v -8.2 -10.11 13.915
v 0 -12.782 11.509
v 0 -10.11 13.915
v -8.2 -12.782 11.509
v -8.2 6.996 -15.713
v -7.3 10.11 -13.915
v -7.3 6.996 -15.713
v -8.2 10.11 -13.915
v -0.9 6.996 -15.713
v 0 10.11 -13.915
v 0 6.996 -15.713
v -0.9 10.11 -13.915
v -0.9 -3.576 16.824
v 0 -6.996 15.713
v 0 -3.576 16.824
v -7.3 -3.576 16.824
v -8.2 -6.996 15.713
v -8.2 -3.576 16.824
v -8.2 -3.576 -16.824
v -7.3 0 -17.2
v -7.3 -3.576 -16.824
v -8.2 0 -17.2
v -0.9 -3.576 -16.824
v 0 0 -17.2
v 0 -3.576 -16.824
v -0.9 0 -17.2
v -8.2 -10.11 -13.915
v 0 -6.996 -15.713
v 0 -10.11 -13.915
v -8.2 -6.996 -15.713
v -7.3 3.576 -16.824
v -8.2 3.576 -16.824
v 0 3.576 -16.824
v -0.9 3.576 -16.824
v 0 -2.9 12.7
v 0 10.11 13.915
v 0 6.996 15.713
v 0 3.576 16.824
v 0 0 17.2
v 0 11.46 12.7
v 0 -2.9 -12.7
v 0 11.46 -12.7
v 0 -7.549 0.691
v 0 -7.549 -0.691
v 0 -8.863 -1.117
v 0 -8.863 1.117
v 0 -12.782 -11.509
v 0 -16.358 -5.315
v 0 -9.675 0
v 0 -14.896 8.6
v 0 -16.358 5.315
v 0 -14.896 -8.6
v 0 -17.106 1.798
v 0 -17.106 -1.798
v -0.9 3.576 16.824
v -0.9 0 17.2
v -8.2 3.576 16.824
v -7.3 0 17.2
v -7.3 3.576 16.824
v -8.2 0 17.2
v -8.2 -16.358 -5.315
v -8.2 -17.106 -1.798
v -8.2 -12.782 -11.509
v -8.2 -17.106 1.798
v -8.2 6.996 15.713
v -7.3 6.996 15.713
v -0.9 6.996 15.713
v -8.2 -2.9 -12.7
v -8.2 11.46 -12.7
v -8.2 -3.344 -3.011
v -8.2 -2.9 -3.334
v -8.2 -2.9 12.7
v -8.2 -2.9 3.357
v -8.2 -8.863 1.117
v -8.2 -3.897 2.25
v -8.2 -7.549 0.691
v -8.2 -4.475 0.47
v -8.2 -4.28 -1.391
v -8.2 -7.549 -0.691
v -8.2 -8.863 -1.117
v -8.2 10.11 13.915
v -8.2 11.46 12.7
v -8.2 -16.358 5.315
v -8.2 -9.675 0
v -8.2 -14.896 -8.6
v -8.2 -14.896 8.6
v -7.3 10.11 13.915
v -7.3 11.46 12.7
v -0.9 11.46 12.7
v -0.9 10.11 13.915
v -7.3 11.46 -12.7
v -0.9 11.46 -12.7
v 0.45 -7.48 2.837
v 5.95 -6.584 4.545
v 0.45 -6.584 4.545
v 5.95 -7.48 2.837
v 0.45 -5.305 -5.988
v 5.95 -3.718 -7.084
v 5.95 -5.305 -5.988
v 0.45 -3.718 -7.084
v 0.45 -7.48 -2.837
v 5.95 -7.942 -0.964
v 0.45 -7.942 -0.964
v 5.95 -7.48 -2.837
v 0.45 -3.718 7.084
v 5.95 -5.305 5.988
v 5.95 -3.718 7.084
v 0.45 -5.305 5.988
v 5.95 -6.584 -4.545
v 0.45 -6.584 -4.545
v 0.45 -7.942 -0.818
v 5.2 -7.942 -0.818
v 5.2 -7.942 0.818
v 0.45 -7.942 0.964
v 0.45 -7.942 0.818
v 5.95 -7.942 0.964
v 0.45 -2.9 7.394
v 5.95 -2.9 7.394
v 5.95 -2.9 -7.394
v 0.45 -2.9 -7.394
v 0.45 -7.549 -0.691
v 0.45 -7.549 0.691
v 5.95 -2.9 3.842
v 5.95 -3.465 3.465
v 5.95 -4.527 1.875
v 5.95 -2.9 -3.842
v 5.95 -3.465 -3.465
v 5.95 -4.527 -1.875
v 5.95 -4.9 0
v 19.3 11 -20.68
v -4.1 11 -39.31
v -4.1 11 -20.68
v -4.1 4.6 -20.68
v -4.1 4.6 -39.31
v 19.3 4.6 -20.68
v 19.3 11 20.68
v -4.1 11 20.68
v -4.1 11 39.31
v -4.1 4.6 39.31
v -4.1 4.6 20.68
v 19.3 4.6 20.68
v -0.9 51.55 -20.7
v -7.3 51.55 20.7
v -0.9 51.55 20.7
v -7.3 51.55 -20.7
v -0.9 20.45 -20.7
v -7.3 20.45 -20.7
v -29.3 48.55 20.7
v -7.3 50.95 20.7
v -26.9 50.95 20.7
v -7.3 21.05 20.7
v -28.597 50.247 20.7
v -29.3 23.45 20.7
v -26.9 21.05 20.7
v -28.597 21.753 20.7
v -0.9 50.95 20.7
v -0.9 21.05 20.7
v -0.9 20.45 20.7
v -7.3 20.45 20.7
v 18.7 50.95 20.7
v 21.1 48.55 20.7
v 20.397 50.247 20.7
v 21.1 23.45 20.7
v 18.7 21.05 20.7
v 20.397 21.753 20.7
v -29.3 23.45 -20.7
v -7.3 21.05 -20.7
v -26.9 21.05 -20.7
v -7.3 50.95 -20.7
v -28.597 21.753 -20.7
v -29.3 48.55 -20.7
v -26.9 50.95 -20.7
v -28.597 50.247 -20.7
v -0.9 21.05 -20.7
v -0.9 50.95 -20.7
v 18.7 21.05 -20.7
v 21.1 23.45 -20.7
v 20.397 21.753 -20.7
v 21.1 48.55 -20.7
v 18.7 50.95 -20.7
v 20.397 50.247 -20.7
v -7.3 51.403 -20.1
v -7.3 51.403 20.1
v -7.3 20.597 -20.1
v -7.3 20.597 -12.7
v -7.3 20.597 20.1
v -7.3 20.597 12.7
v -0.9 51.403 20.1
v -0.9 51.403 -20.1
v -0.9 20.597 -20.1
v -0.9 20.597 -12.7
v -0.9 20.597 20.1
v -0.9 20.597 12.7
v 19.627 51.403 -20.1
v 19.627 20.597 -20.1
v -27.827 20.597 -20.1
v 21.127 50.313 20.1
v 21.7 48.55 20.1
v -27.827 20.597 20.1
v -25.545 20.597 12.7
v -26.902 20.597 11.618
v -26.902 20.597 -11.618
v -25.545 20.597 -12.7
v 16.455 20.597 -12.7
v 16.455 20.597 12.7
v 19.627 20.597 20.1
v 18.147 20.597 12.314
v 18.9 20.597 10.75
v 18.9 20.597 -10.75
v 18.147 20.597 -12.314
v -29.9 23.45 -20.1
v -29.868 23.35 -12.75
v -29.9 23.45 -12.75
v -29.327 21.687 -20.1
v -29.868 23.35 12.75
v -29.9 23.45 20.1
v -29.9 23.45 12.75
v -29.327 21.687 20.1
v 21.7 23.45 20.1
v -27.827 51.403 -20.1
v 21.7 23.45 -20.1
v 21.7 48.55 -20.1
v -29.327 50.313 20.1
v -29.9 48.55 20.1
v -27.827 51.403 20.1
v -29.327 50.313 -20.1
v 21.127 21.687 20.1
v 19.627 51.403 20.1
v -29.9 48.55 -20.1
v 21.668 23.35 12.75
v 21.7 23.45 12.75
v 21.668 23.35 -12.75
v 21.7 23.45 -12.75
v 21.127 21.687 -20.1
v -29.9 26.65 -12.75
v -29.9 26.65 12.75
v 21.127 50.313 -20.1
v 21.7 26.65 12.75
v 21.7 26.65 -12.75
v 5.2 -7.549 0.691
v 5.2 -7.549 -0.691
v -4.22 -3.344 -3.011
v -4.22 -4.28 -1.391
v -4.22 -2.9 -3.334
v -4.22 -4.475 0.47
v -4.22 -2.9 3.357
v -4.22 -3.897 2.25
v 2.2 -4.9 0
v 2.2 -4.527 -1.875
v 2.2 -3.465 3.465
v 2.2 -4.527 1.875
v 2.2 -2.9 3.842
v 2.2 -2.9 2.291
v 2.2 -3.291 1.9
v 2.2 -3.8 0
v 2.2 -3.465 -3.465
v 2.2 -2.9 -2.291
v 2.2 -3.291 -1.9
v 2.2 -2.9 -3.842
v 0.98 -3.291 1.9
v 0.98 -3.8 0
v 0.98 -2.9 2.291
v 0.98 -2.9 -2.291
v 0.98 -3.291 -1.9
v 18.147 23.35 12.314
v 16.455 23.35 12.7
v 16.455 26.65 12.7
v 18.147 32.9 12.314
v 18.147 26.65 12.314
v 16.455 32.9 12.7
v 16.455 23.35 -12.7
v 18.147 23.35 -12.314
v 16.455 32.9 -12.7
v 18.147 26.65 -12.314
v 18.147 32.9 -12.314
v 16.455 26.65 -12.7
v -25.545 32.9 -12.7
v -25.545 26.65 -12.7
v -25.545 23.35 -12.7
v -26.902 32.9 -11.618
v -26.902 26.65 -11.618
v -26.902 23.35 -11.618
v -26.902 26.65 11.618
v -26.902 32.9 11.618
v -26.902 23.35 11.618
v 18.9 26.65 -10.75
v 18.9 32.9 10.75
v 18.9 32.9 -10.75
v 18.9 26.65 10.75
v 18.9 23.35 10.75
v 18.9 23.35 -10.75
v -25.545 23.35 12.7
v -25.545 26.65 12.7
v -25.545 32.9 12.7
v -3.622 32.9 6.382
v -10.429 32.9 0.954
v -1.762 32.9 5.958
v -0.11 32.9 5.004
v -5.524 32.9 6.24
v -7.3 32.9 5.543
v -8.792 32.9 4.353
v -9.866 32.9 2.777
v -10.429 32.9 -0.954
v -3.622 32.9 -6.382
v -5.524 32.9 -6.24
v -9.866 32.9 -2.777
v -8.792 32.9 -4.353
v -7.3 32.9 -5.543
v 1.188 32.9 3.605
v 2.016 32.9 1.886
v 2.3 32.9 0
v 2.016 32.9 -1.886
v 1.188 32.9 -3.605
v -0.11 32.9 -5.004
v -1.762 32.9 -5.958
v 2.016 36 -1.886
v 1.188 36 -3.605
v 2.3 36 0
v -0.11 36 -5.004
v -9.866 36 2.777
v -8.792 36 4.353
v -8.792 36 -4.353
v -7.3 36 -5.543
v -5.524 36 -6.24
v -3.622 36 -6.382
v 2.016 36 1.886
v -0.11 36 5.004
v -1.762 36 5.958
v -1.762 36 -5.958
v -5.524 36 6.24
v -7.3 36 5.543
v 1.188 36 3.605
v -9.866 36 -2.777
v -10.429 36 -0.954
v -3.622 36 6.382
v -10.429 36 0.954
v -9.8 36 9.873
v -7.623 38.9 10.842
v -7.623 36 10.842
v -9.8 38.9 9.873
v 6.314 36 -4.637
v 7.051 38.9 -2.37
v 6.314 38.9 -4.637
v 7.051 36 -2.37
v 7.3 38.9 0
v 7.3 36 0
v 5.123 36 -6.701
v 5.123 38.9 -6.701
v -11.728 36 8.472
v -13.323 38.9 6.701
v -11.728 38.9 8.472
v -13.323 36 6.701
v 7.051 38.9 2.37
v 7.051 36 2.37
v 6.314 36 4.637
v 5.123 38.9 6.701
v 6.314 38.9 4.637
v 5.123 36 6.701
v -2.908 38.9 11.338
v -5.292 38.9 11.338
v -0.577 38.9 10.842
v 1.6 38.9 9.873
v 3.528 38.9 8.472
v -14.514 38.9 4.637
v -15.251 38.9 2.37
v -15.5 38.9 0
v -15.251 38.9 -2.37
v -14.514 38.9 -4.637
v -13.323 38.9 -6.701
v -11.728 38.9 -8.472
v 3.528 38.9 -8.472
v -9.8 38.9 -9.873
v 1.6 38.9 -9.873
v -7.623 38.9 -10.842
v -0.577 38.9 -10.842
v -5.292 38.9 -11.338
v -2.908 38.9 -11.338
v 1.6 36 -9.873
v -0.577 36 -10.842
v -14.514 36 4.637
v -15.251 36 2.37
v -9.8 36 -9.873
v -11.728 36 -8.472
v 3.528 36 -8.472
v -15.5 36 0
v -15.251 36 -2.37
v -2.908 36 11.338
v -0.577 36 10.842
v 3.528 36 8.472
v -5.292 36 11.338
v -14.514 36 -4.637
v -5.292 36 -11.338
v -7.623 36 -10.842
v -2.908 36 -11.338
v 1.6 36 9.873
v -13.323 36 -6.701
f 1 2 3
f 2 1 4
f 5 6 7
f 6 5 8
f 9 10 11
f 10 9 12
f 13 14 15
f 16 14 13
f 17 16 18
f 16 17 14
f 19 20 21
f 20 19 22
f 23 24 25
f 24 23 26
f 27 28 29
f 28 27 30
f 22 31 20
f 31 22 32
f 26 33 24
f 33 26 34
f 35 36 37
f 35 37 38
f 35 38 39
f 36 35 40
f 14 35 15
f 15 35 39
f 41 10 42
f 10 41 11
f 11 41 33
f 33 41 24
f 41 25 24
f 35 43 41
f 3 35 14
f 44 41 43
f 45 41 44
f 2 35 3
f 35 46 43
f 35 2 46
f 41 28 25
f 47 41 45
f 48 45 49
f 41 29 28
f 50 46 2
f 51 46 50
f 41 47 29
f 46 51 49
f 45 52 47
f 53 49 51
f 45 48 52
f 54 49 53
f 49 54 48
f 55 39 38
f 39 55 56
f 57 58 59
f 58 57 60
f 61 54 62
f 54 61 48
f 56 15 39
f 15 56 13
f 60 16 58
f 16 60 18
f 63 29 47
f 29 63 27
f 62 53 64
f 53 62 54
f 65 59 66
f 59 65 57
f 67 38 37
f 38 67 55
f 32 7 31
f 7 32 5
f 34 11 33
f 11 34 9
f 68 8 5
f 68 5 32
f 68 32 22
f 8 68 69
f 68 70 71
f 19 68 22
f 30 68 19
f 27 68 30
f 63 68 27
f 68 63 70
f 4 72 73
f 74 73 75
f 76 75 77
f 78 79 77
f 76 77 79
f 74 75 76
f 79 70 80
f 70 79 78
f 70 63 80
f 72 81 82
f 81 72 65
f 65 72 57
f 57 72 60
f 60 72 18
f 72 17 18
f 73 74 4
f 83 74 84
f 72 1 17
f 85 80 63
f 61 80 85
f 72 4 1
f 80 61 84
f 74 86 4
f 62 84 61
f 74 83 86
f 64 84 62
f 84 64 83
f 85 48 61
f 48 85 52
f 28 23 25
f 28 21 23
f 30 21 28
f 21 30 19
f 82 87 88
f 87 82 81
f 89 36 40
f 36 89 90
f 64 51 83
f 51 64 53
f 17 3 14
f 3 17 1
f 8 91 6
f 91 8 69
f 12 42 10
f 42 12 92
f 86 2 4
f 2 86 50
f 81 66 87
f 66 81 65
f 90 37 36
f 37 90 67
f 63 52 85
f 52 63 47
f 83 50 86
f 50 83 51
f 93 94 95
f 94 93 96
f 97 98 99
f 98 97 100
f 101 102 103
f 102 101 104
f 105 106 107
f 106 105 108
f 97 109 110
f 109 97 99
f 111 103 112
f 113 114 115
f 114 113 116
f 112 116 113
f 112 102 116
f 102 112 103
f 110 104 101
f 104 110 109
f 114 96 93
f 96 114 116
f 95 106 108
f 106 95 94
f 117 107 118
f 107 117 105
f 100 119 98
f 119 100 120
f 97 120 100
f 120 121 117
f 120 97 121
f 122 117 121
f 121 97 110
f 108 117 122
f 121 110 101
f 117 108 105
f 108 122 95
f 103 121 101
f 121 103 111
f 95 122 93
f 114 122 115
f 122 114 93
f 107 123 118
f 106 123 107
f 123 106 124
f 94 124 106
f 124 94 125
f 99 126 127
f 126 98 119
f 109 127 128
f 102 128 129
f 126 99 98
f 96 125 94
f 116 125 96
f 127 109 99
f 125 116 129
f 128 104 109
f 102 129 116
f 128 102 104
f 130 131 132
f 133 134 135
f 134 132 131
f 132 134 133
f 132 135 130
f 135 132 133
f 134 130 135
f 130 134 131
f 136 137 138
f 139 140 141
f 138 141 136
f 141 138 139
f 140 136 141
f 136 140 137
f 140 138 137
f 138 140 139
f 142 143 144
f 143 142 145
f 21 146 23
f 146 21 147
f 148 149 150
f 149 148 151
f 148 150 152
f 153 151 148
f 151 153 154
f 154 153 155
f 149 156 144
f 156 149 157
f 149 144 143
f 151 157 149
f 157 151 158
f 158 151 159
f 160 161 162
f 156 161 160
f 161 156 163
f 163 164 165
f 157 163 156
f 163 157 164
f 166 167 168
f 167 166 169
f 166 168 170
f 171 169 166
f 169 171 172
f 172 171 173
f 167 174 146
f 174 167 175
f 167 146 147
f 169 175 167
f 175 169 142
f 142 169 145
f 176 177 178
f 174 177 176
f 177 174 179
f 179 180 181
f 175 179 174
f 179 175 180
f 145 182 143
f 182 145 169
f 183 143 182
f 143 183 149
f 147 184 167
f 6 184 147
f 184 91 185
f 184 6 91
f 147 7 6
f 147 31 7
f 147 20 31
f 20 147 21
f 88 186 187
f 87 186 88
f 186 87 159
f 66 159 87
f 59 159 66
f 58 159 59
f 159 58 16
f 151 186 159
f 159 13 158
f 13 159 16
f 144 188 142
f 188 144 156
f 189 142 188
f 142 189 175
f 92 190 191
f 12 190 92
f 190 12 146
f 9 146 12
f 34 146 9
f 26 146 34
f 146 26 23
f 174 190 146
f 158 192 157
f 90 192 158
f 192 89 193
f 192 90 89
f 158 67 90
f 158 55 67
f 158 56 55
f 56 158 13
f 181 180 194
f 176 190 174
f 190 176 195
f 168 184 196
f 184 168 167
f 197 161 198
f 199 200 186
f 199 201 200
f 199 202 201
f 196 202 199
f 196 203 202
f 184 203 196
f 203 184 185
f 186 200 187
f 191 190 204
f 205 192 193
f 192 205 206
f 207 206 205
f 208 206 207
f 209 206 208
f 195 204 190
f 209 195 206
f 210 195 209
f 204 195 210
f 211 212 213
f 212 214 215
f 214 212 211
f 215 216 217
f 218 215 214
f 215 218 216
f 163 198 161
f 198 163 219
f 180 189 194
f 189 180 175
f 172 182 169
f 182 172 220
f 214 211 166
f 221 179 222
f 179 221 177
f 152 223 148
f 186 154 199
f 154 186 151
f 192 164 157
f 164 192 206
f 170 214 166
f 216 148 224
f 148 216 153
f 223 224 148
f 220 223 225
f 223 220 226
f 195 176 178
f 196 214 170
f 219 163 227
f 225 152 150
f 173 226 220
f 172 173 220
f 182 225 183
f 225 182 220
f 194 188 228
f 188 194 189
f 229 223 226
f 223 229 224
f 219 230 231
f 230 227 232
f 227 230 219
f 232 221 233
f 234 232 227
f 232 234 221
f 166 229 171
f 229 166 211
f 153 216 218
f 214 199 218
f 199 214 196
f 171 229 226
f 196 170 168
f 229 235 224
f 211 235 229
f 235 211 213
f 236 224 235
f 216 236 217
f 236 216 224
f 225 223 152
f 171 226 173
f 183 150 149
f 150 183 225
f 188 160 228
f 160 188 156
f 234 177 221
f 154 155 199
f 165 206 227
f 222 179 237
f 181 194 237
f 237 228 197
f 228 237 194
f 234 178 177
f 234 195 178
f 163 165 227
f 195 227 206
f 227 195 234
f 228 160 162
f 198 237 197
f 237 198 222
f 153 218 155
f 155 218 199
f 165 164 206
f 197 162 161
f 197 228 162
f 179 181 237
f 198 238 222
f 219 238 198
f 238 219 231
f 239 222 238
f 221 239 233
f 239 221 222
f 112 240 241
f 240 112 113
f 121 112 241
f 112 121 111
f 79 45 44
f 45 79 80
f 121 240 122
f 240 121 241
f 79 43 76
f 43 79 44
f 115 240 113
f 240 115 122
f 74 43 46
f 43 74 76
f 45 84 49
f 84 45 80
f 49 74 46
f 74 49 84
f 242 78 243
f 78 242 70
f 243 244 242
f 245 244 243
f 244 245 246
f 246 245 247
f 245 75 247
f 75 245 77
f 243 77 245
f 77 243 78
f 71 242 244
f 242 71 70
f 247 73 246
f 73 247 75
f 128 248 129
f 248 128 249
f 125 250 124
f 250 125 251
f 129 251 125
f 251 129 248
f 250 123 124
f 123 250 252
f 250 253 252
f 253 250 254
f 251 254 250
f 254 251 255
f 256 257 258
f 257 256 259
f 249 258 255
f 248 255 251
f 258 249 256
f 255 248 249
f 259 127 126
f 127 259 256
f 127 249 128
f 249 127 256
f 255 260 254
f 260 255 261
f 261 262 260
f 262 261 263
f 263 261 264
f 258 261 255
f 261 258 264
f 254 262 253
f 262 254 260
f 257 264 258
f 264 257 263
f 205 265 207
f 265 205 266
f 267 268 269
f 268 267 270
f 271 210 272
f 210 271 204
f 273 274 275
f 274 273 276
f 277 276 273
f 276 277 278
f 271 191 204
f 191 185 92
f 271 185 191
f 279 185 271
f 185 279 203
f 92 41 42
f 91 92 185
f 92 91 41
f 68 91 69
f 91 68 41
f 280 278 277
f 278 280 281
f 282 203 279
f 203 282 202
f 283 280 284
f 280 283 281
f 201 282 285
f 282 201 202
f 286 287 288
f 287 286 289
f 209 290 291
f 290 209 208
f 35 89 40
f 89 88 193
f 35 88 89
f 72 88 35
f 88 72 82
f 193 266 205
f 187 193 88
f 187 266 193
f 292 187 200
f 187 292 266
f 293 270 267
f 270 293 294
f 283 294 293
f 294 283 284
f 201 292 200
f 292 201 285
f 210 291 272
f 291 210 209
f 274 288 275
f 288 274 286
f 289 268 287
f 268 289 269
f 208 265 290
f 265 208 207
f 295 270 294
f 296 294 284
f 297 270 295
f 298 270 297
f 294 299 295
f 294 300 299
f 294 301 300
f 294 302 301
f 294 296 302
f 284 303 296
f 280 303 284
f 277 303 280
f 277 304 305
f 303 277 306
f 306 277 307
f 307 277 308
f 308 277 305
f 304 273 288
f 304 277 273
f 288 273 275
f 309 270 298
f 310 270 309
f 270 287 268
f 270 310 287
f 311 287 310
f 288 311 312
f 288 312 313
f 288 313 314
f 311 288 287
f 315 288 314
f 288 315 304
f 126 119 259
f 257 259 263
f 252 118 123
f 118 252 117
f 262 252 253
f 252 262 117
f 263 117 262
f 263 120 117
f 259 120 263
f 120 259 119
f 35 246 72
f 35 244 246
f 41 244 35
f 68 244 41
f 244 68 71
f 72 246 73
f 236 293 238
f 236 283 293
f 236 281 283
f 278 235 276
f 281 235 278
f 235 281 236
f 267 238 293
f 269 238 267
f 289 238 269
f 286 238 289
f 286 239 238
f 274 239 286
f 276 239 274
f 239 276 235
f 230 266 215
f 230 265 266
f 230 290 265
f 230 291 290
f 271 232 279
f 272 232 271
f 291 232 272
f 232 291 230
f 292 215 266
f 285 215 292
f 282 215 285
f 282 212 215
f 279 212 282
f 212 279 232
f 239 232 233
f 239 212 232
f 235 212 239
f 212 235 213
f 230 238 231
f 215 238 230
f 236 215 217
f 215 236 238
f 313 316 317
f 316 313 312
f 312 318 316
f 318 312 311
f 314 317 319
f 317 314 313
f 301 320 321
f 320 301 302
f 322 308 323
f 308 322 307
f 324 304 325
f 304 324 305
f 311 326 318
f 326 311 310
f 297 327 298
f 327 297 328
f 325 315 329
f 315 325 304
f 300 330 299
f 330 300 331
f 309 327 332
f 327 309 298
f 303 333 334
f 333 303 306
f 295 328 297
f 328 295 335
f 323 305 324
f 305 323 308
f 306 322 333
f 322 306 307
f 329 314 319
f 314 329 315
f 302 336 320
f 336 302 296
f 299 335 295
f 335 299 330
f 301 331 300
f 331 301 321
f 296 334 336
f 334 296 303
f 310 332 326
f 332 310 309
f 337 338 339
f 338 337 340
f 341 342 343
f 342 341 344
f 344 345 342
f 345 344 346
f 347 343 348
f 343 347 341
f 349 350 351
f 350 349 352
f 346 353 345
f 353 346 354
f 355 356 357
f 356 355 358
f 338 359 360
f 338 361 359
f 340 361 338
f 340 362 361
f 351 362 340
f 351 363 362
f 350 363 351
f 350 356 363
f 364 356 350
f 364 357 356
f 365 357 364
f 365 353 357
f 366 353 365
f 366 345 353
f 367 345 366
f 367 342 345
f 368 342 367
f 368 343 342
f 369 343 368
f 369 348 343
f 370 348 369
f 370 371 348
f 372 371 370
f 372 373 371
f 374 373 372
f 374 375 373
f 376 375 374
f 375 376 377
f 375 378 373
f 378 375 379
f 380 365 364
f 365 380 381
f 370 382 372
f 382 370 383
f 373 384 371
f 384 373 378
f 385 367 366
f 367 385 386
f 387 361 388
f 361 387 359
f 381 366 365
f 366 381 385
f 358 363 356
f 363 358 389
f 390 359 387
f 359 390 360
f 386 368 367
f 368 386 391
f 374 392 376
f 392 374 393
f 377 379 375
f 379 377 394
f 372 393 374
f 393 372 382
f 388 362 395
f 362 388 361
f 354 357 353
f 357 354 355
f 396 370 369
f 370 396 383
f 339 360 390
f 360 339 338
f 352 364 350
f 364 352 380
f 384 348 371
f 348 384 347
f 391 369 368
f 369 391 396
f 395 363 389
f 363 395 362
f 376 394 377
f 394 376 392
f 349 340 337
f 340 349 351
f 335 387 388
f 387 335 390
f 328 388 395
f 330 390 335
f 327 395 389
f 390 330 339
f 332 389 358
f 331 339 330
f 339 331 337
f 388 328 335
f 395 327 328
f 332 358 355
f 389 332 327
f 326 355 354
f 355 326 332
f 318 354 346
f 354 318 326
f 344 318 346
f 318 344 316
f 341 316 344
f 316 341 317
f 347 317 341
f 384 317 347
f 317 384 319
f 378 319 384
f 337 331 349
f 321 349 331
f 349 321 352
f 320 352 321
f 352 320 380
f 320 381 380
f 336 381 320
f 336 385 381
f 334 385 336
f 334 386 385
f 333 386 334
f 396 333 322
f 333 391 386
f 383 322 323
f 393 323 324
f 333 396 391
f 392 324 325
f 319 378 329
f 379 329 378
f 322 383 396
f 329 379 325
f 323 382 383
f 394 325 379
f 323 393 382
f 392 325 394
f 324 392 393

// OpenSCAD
// file: ../lib/derived_gen.scad
// GENERATED by `python -m bestiary.robots.whelp.export`. DO NOT EDIT.
//
// Every number here comes from spec.py, which carries its provenance, or from
// geometry.py, which derives it. check.py fails if regenerating this file changes
// it, so a hand edit here is not merely discouraged -- it is caught.
//
// To change a dimension: edit spec.py, re-run export, commit both.


// The SOLVED standing stance. Not typed -- geometry.solve_stance_knee()
// puts the wheel axle directly under the hip pivot, which makes the hip's
// static holding torque exactly zero. The URDF is generated from this same
// call, so the assembly preview and the simulation cannot drift apart.

STANCE_ABDUCT = 0;   // rad
STANCE_HIP    = 0.46;
STANCE_KNEE   = -0.97019;
STANCE_ABDUCT_DEG = 0;
STANCE_HIP_DEG    = 26.356059;
STANCE_KNEE_DEG   = -55.587783;

AXLE_DROP     = 185.830956;   // hip pivot -> axle, mm
KNEE_LEVER    = 48.834292;
STAND_HEIGHT  = 229.430956;
WHEEL_CENTRE_Y = 89;
LOADED_WHEEL_R = 43.6;

// Leg placement: [x sign, y sign] per leg, in FL FR RL RR order.
LEG_SIGNS = [[1, 1], [1, -1], [-1, 1], [-1, -1]];
LEG_NAMES = ["FL", "FR", "RL", "RR"];
// file: ../lib/params_gen.scad
// GENERATED by `python -m bestiary.robots.whelp.export`. DO NOT EDIT.
//
// Every number here comes from spec.py, which carries its provenance, or from
// geometry.py, which derives it. check.py fails if regenerating this file changes
// it, so a hand edit here is not merely discouraged -- it is caught.
//
// To change a dimension: edit spec.py, re-run export, commit both.


// 73 constants,
// spec = whelp16, servo = STS3215-C018, material = PETG

TRUNK_L = 250;
TRUNK_W = 104;
TRUNK_H = 58;
TRUNK_WALL = 2.4;
TRUNK_LAP = 26;
ABDUCT_X = 92;
ABDUCT_Y = 36;
ABDUCT_TO_HIP = 36;
ABDUCT_TO_HIP_DROP = 0;
THIGH_L = 110;
CALF_L = 100;
WHEEL_R = 45;
WHEEL_W = 24;
CALF_TO_WHEEL_PLANE = 17;
THIGH_D = 30;
THIGH_WID = 32;
THIGH_WALL = 3.2;
CALF_D = 26;
CALF_WID = 24;
CALF_WALL = 3.2;
FILLET_R = 3;
SERVO_BODY_L = 45.2;
SERVO_BODY_W = 24.7;
SERVO_BODY_H = 35;
SERVO_HORN_BOLT_CIRCLE_D = 17;
SERVO_HORN_BOLT_COUNT = 4;
SERVO_HORN_BOLT_D = 2;
SERVO_HORN_D = 22;
SERVO_HORN_THICK = 2.5;
HORN_BOSS_THICK = 5;
SERVO_HORN_FACE_TO_BODY = 3.5;
SERVO_HORN_HUB_CLEAR_D = 9;
SERVO_HORN_HUB_CLEAR_H = 4;
SERVO_MOUNT_HOLE_DX = 38;
SERVO_MOUNT_HOLE_DY = 18;
SERVO_EAR_SPAN_L = 54;
SERVO_EAR_THICK = 2.5;
SERVO_EAR_Z_FROM_BODY_MID = 10;
SERVO_HAS_REAR_BOSS = true;
SERVO_REAR_BOSS_D = 6;
SERVO_REAR_BOSS_H = 2;
SERVO_OUTPUT_BOSS_D = 12;
SERVO_CABLE_D = 5;
SERVO_CABLE_INSET = 6;
SERVO_CABLE_STUB = 18;
INSERT_BORE = 4.2;
INSERT_OD = 4.6;
INSERT_L = 5.7;
INSERT_WALL = 1.8;
M3_CLEAR = 3.4;
M3_HEAD_D = 5.5;
M3_HEAD_H = 3;
M3_NUT_AF = 5.5;
M3_NUT_T = 2.4;
IDLER_BEARING_ID = 3;
IDLER_BEARING_OD = 10;
IDLER_BEARING_W = 4;
IDLER_BEARING_SHELF = 1.2;
BEARING_PRESS_FIT = -0.2;
TIRE_T = 12;
FUSE_T = 2;
FUSE_SHEAR_AREA = 10;
FUSE_ENABLE = true;
BED_X = 220;
BED_Y = 220;
BED_Z = 240;
NOZZLE = 0.4;
LAYER = 0.2;
FN = 64;

// Derived clearances (nominal thread + printing allowance).
SERVO_MOUNT_SCREW_CLEAR_D = 2.9;
SERVO_MOUNT_SCREW_HEAD_D = 5;
SERVO_MOUNT_SCREW_HEAD_H = 2.5;
SERVO_HORN_BOLT_CLEAR_D = 2.35;
// main file
// abduct_bracket.scad — the hip carrier. One module: abduct_bracket().
//
// FRAME. Origin AT THE ABDUCTION AXIS, which runs along X (fore-aft). This part
// rotates about X and carries the HIP servo, whose output axis is along Y at
// (0, ABDUCT_TO_HIP, -ABDUCT_TO_HIP_DROP). Authored LEFT; mirrored for the right.
//
// This is the most three-dimensional part on the robot: it takes drive about X
// and delivers a mount for a servo whose axis is Y, so it turns a corner. It is
// also the part that carries the entire leg -- about 830 g at up to 190 mm of
// reach -- so it is where a missing fillet costs the most.
//
// ─────────────────────────────────────────────────────────────────────────────
// AN UNRESOLVED INTERFACE, STATED RATHER THAN PAPERED OVER
// ─────────────────────────────────────────────────────────────────────────────
// This file and parts/trunk.scad do not yet agree on how the bracket leaves the
// trunk, and neither has been rendered, so the disagreement is documented here
// instead of being hidden behind a guess.
//
// The kinematics is unambiguous. geometry.build_chain() puts the abduction pivot
// at (+/-ABDUCT_X, +/-ABDUCT_Y, 0) and the hip pivot one step outboard of it at
// (0, +/-ABDUCT_TO_HIP, 0) in the bracket's own frame -- i.e. SAME X, 36 mm
// further out in Y. So the hip axis lands at |y| = 72 mm, which is 20 mm OUTBOARD
// of the trunk's 52 mm half-width. The bracket must therefore cross the trunk's
// SIDE boundary, and it must do so at x = +/-ABDUCT_X.
//
// trunk.scad instead puts a JOURNAL_D plain journal through the trunk's END wall
// at |x| = 125, coaxial with the abduction axis, and has the bracket reach out
// through it. That is a good bearing arrangement and it is a different topology:
// it would place the hip pivot outboard in X, not in Y, which the URDF does not
// describe.
//
// This file is authored to the KINEMATICS, because the URDF is what a policy is
// trained against and the plastic is what has to match it -- not the other way
// round. It exits over the trunk's top rim and down its outside face, which is
// possible precisely because the shell is open-topped for printing. The cost is
// that the second support is a boss on the shell's outer face rather than a
// journal in the end wall, and that boss is NOT modelled here because it belongs
// to the trunk.
//
// WHAT TO DO ABOUT IT, in order of preference:
//   1. Install OpenSCAD, render trunk_front() and abduct_bracket() together, and
//      look. Neither has ever been executed; that is the only honest next step
//      and it is one apt-get away.
//   2. If the over-rim route fouls the lid, move the abduction pivot outboard
//      (raise abduct_y_mm toward the side wall) and shorten abduct_to_hip_mm to
//      keep the track and the abduction moment arm where torque.py wants them.
//      Both are single numbers in spec.py with provenance entries.
//   3. Only then consider changing the URDF, and if so, change spec.py so the
//      kinematics and the CAD are generated from one description again.
//
// Do NOT resolve it by editing params_gen.scad. It is generated, and check.py
// fails if regenerating it changes a byte.
// ─────────────────────────────────────────────────────────────────────────────
//
// PRINT ORIENTATION: the X-axis hub laid on the bed, so the horn pad's face is a
// vertical wall and the leg's bending moment about the abduction axis runs
// in-plane with the extrusions. The cradle for the hip servo then grows upward
// off the hub as a wall rather than hanging off it as an overhang. Footprint
// about 60 x 74 mm.

include <../lib/params_gen.scad>
include <../lib/derived_gen.scad>
use <../lib/util.scad>
use <../lib/sts3215.scad>

EPS = 0.02;

// ── Local numbers ────────────────────────────────────────────────────────────
WALL       = THIGH_WALL;                       // one wall standard across the leg
HUB_D      = SERVO_HORN_D + 2 * WALL + 6;      // the X-axis hub
HUB_L      = HORN_BOSS_THICK + WALL;           // its length along X
ARM_Y      = ABDUCT_TO_HIP;                    // hub centre -> hip axis, laterally
ARM_T      = WALL * 2;                         // the reach's web thickness
ARM_H      = SERVO_BODY_H + 2 * WALL;          // its depth in Z
CRADLE_L   = SERVO_BODY_L + 2 * WALL;
CRADLE_W   = SERVO_BODY_W + 2 * WALL;
GUSSET_L   = ARM_Y * 0.65;
CABLE_R    = SERVO_CABLE_D * 1.6;              // service-loop radius, see below

module abduct_checks() {
    assert(HUB_D / 2 >= SERVO_HORN_BOLT_CIRCLE_D / 2 + SERVO_HORN_BOLT_D + WALL,
           str("hub ", HUB_D, " mm is too small for a ", SERVO_HORN_BOLT_CIRCLE_D,
               " mm bolt circle plus ", WALL, " mm of wall"));
    assert(ARM_Y > CRADLE_W / 2,
           str("hip axis at ", ARM_Y, " mm is inside the servo cradle; the arm has ",
               "nowhere to reach"));
    assert(ABDUCT_TO_HIP_DROP == 0,
           str("this bracket assumes a coplanar hip pivot; ABDUCT_TO_HIP_DROP is ",
               ABDUCT_TO_HIP_DROP));
    assert(max(HUB_L + CRADLE_L, ARM_Y + CRADLE_W) <= BED_X,
           "abduction bracket does not fit the bed");
}

// ── The hub: driven about X, in double shear ──────────────────────────────────
//
// Horn pad on -X, idler bearing on +X, coaxial. The STS3215 is a DUAL-SHAFT
// servo -- there is a boss opposite the horn -- so the far-side bearing rides on
// the servo's own casting and is coaxial BY CONSTRUCTION rather than by assembly.
// That distinction matters: a bearing aligned by assembly preloads both itself
// and the servo's own bushing by whatever the build tolerance is, and the whole
// point of the second support is to take load OFF that bushing.
module abduct_hub_solid() {
    translate([-HUB_L / 2, 0, 0])
        rotate([0, 90, 0]) cylinder(d = HUB_D, h = HUB_L, center = true);
    translate([WALL, 0, 0])
        rotate([0, 90, 0])
            cylinder(d = IDLER_BEARING_OD + 6, h = IDLER_BEARING_W + 1.5,
                     center = true);
}

module abduct_hub_cuts() {
    translate([-HUB_L - EPS, 0, 0])
        rotate([0, 90, 0]) sts3215_horn_holes(HUB_L + WALL + 2);
    translate([WALL + IDLER_BEARING_W / 2 + 1, 0, 0])
        rotate([0, -90, 0])
            bearing_pocket(IDLER_BEARING_OD, IDLER_BEARING_W, BEARING_PRESS_FIT,
                           shelf = IDLER_BEARING_SHELF,
                           bore_clear = IDLER_BEARING_ID + 1);
}

// ── The reach: hub to hip cradle ──────────────────────────────────────────────
//
// A pair of webs rather than one, so the section has torsional stiffness. The
// leg's weight arrives at the cradle and leaves through the hub, and between
// them the load is carried in BENDING about X -- in-plane with the layers in the
// stated print orientation, which is the whole reason for that orientation.
module abduct_arm() {
    hull() {
        translate([-HUB_L / 2, 0, 0])
            rotate([0, 90, 0]) cylinder(d = HUB_D, h = ARM_T, center = true);
        translate([-HUB_L / 2, ARM_Y, 0])
            cube([ARM_T, CRADLE_W, ARM_H], center = true);
    }
}

// Gussets where the X-axis structure meets the Y-axis cradle.
//
// THE HIGHEST-STRESS REGION ON THE ROBOT. Everything the leg weighs, times its
// reach, is reacted across this corner. A bare 90-degree corner here would carry
// a stress concentration near 3.0 in bending and roughly half the fatigue life,
// and a leg joint at a 2 Hz gait reaches 1e6 cycles in about 140 hours of
// walking -- so the failure would arrive after the robot had been working fine
// for a week.
module abduct_gussets() {
    for (sz = [-1, 1])
        translate([-HUB_L / 2, HUB_D / 2 - FILLET_R, sz * (ARM_H / 2 - EPS)])
            rotate([0, 0, 0])
                mirror([0, 0, sz > 0 ? 0 : 1])
                    gusset(GUSSET_L, ARM_H * 0.45, ARM_T);
}

// ── The hip servo cradle ─────────────────────────────────────────────────────
module abduct_cradle_solid() {
    translate([-HUB_L / 2, ARM_Y, 0])
        rounded_plate(CRADLE_L, CRADLE_W, ARM_H, r = FILLET_R, c = 0.6);
}

module abduct_cradle_cuts() {
    translate([-HUB_L / 2, ARM_Y, 0])
        rotate([-90, 0, 0]) {
            sts3215_body(0.4);
            sts3215_cable_envelope();
            sts3215_mount_holes(CRADLE_W + 2);
        }
}

// ── Cable routing, which is a moving problem here ────────────────────────────
//
// TWO harnesses pass this bracket -- the abduction servo's daisy chain and the
// hip servo's -- and unlike every other link, THIS ONE ROTATES relative to the
// trunk, through the full +/-0.8 rad abduction range. So the channel is
// deliberately oversized: it has to hold a service loop that can take up 1.6 rad
// of relative rotation without the loom going tight at either end.
//
// A pinched bus cable does not fail one joint. It fails the BUS, and sixteen
// servos go silent at once.
module abduct_cable_route() {
    hull() {
        translate([-HUB_L / 2, HUB_D / 2 - CABLE_R, 0])
            rotate([0, 90, 0]) cylinder(r = CABLE_R, h = ARM_T + 2 * EPS,
                                        center = true);
        translate([-HUB_L / 2, ARM_Y - CRADLE_W / 2, 0])
            rotate([0, 90, 0]) cylinder(r = CABLE_R, h = ARM_T + 2 * EPS,
                                        center = true);
    }
}

// ── The part ─────────────────────────────────────────────────────────────────
module abduct_bracket() {
    abduct_checks();
    difference() {
        union() {
            abduct_hub_solid();
            abduct_arm();
            abduct_gussets();
            abduct_cradle_solid();
        }
        abduct_hub_cuts();
        abduct_cradle_cuts();
        abduct_cable_route();
    }
}

abduct_bracket();
